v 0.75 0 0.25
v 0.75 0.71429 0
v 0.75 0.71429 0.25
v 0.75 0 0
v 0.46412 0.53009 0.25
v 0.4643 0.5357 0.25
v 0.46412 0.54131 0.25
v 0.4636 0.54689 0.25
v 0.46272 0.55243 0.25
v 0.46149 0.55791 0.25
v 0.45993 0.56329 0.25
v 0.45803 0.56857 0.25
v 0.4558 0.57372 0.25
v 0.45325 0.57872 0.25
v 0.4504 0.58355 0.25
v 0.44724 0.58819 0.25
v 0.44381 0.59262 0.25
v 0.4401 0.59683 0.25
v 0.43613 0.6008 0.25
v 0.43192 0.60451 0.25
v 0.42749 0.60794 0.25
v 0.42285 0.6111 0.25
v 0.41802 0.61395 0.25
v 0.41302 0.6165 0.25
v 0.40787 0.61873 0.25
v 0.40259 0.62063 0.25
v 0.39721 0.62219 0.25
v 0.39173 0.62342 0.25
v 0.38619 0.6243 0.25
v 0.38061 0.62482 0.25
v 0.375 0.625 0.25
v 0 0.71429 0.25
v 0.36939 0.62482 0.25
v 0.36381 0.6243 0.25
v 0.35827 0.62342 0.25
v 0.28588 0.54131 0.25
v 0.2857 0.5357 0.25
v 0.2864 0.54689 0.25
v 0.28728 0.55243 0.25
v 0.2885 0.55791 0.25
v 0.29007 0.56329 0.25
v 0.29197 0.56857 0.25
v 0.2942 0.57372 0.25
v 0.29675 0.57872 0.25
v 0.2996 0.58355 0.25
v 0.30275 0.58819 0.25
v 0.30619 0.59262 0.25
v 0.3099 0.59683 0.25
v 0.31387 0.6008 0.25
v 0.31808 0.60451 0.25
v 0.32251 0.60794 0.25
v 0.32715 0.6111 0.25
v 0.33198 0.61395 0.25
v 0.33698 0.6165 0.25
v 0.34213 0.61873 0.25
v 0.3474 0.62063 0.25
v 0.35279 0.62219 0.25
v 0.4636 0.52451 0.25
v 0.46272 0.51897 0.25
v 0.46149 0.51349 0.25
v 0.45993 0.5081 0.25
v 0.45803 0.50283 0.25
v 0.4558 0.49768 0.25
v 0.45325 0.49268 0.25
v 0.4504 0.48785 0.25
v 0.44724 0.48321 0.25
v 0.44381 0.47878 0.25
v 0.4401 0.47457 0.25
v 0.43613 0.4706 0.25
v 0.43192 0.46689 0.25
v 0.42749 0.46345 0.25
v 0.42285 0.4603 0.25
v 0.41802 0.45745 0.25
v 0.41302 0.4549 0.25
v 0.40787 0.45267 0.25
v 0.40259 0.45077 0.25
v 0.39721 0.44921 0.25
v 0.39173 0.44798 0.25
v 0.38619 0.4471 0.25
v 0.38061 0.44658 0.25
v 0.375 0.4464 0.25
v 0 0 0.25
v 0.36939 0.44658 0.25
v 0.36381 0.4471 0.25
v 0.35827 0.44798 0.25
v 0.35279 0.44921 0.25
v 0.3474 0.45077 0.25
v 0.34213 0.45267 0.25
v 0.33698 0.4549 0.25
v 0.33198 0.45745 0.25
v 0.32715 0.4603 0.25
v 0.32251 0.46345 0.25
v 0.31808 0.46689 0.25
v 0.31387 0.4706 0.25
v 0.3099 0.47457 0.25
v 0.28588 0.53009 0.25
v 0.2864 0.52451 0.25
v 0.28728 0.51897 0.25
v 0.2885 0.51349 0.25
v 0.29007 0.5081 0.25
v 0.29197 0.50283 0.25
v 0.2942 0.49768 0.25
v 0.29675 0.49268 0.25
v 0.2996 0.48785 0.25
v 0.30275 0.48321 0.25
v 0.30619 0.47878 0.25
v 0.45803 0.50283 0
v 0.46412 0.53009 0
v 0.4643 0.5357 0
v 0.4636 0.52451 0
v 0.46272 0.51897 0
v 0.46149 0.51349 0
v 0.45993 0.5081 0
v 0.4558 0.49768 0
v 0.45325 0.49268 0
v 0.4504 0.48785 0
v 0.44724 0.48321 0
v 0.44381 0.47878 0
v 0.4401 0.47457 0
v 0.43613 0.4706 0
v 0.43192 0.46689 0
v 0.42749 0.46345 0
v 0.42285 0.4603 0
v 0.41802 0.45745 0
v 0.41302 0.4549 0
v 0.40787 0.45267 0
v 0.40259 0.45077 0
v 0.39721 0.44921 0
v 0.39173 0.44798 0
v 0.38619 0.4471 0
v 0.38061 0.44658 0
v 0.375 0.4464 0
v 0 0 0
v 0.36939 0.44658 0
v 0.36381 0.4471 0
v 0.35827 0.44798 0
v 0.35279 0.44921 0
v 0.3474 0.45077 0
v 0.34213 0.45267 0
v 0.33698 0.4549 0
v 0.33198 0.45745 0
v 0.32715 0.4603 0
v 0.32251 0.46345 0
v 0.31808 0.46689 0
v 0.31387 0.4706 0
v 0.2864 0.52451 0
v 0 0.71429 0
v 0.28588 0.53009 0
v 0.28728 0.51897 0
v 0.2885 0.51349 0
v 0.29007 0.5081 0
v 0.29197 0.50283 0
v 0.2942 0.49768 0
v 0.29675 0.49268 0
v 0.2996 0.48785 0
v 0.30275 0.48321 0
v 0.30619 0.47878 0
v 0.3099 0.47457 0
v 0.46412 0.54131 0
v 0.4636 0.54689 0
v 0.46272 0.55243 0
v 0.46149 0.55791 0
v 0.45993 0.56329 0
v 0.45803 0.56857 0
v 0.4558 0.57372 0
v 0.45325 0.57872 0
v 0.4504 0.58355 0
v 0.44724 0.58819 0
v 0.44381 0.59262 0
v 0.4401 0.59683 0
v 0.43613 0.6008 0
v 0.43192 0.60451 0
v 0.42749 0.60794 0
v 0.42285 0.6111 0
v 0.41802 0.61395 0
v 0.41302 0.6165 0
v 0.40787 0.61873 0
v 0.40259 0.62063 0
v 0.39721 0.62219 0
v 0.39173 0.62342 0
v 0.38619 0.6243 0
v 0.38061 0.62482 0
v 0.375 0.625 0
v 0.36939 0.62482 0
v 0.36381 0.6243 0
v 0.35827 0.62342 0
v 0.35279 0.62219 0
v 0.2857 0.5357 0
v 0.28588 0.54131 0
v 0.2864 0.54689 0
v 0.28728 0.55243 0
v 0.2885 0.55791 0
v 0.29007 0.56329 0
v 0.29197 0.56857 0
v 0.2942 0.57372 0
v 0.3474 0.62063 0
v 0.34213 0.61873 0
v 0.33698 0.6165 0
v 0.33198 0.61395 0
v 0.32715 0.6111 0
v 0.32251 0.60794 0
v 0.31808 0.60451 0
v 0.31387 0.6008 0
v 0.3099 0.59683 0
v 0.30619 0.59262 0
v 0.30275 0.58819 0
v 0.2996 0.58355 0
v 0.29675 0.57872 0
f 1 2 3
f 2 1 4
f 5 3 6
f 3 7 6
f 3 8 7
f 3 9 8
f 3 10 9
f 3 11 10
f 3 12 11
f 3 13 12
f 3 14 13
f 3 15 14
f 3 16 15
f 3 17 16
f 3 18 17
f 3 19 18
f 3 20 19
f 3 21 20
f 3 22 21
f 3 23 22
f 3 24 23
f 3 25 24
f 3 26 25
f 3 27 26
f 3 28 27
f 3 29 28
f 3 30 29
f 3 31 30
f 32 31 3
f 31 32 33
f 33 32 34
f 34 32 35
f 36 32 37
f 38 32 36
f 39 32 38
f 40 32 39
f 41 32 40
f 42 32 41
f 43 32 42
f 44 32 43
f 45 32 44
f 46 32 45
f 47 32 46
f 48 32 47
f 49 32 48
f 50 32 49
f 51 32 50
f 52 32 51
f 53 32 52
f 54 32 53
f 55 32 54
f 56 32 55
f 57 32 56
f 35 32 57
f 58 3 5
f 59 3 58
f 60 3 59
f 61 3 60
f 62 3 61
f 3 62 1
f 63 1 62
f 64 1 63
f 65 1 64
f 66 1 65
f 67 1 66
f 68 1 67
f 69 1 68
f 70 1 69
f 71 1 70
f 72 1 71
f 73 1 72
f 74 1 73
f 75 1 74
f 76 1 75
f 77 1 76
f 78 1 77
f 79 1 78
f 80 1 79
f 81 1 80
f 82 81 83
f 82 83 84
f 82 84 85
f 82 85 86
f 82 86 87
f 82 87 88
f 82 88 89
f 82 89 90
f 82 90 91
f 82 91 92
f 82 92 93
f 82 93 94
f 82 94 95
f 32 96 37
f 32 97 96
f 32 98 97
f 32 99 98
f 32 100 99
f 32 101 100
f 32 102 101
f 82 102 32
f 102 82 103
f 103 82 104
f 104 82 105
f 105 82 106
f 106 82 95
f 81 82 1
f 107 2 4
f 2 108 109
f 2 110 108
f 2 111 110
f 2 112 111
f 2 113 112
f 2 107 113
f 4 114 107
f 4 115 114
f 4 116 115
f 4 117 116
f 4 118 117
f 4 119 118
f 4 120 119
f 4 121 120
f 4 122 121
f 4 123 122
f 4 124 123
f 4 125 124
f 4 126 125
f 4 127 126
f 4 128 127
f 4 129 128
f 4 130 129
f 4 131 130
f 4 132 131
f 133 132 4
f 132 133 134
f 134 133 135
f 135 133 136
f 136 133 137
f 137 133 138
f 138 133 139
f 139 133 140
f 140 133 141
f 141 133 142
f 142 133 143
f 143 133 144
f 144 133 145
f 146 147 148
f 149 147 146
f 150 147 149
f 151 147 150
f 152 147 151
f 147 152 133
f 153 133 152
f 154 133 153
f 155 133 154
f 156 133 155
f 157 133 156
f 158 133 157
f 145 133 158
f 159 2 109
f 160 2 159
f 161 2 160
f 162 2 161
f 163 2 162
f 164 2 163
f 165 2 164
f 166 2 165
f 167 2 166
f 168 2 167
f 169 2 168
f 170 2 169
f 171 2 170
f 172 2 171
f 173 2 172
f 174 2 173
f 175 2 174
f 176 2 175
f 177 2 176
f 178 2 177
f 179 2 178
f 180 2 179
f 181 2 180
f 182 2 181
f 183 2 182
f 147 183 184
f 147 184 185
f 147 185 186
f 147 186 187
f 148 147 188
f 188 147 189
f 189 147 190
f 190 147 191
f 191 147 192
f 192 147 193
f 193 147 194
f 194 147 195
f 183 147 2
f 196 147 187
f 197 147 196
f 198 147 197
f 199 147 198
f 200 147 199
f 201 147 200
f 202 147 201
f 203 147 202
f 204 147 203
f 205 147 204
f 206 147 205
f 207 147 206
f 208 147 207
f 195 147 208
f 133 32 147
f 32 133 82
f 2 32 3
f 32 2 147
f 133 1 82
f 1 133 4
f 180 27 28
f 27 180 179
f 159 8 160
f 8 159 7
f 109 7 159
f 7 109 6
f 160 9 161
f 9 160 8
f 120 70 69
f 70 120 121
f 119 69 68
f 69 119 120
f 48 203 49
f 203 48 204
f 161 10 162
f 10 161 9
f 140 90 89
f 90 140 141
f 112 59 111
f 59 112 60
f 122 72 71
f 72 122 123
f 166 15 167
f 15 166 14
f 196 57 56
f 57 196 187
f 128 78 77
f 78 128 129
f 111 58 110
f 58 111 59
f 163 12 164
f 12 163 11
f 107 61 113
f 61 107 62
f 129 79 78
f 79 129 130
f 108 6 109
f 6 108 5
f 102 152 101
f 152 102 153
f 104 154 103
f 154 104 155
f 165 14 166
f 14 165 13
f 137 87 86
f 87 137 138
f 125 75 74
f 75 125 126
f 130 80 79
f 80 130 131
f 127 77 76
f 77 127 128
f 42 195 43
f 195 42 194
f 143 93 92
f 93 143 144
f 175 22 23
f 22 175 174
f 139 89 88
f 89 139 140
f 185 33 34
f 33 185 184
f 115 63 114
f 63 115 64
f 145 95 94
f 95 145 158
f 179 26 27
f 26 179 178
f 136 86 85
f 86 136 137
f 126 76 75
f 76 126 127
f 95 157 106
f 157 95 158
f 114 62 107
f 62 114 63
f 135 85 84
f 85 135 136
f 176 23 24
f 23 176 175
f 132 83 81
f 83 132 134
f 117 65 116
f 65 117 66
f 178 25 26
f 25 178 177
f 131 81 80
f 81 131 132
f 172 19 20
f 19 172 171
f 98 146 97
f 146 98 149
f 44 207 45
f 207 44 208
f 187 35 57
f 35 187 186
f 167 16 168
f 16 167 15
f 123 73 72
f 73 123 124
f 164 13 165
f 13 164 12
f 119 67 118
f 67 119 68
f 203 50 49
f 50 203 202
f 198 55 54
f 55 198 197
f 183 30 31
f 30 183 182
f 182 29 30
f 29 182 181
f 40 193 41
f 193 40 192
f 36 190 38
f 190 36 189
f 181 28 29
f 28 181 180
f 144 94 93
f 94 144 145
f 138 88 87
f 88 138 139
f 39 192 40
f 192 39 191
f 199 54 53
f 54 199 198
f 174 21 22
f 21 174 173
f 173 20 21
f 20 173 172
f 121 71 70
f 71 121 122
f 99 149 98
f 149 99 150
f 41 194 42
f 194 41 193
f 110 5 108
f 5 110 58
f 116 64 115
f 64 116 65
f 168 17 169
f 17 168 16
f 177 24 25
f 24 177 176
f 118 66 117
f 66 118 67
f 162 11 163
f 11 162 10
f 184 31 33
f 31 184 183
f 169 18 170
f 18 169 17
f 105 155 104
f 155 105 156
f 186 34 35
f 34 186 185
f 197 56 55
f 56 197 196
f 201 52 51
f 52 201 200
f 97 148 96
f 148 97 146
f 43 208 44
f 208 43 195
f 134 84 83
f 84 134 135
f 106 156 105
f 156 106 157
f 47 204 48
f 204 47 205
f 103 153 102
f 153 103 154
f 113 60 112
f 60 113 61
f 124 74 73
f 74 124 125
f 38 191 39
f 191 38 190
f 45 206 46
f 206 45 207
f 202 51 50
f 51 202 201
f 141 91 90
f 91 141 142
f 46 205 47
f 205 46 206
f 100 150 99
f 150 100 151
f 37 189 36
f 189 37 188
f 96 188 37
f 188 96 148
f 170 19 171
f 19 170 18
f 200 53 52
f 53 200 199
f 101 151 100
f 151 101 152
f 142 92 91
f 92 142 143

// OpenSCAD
// Parameters
block_length = 0.75;
block_width = 0.714286;
block_height = 0.25;

through_hole_x = 0.375;
through_hole_y = 0.5357;
through_hole_r = 0.0893;

front_cut_r = 0.0491;
front_cut_depth = 0.1071;
front_cut_z_min = 0.0759;
front_cut_z_max = 0.1741;
front_cut_z_center = (front_cut_z_min + front_cut_z_max) / 2;
front_cut1_x = 0.0893;
front_cut2_x = 0.6607;

$fn = 100;

// Main solid block
module main_block() {
    cube([block_length, block_width, block_height]);
}

// Upper through-opening (circular cut along Z axis)
module upper_through_hole() {
    translate([through_hole_x, through_hole_y, -0.01])
        cylinder(h = block_height + 0.02, r = through_hole_r, center = false);
}

// Front side blind circular cuts (aligned along Y axis)
module front_blind_cuts() {
    translate([front_cut1_x, -0.001, front_cut_z_center])
        rotate([90, 0, 0])
        cylinder(h = front_cut_depth + 0.002, r = front_cut_r, center = false);
    translate([front_cut2_x, -0.001, front_cut_z_center])
        rotate([90, 0, 0])
        cylinder(h = front_cut_depth + 0.002, r = front_cut_r, center = false);
}

// Assembly: Subtract features from main block
difference() {
    main_block();
    upper_through_hole();
    front_blind_cuts();
}
